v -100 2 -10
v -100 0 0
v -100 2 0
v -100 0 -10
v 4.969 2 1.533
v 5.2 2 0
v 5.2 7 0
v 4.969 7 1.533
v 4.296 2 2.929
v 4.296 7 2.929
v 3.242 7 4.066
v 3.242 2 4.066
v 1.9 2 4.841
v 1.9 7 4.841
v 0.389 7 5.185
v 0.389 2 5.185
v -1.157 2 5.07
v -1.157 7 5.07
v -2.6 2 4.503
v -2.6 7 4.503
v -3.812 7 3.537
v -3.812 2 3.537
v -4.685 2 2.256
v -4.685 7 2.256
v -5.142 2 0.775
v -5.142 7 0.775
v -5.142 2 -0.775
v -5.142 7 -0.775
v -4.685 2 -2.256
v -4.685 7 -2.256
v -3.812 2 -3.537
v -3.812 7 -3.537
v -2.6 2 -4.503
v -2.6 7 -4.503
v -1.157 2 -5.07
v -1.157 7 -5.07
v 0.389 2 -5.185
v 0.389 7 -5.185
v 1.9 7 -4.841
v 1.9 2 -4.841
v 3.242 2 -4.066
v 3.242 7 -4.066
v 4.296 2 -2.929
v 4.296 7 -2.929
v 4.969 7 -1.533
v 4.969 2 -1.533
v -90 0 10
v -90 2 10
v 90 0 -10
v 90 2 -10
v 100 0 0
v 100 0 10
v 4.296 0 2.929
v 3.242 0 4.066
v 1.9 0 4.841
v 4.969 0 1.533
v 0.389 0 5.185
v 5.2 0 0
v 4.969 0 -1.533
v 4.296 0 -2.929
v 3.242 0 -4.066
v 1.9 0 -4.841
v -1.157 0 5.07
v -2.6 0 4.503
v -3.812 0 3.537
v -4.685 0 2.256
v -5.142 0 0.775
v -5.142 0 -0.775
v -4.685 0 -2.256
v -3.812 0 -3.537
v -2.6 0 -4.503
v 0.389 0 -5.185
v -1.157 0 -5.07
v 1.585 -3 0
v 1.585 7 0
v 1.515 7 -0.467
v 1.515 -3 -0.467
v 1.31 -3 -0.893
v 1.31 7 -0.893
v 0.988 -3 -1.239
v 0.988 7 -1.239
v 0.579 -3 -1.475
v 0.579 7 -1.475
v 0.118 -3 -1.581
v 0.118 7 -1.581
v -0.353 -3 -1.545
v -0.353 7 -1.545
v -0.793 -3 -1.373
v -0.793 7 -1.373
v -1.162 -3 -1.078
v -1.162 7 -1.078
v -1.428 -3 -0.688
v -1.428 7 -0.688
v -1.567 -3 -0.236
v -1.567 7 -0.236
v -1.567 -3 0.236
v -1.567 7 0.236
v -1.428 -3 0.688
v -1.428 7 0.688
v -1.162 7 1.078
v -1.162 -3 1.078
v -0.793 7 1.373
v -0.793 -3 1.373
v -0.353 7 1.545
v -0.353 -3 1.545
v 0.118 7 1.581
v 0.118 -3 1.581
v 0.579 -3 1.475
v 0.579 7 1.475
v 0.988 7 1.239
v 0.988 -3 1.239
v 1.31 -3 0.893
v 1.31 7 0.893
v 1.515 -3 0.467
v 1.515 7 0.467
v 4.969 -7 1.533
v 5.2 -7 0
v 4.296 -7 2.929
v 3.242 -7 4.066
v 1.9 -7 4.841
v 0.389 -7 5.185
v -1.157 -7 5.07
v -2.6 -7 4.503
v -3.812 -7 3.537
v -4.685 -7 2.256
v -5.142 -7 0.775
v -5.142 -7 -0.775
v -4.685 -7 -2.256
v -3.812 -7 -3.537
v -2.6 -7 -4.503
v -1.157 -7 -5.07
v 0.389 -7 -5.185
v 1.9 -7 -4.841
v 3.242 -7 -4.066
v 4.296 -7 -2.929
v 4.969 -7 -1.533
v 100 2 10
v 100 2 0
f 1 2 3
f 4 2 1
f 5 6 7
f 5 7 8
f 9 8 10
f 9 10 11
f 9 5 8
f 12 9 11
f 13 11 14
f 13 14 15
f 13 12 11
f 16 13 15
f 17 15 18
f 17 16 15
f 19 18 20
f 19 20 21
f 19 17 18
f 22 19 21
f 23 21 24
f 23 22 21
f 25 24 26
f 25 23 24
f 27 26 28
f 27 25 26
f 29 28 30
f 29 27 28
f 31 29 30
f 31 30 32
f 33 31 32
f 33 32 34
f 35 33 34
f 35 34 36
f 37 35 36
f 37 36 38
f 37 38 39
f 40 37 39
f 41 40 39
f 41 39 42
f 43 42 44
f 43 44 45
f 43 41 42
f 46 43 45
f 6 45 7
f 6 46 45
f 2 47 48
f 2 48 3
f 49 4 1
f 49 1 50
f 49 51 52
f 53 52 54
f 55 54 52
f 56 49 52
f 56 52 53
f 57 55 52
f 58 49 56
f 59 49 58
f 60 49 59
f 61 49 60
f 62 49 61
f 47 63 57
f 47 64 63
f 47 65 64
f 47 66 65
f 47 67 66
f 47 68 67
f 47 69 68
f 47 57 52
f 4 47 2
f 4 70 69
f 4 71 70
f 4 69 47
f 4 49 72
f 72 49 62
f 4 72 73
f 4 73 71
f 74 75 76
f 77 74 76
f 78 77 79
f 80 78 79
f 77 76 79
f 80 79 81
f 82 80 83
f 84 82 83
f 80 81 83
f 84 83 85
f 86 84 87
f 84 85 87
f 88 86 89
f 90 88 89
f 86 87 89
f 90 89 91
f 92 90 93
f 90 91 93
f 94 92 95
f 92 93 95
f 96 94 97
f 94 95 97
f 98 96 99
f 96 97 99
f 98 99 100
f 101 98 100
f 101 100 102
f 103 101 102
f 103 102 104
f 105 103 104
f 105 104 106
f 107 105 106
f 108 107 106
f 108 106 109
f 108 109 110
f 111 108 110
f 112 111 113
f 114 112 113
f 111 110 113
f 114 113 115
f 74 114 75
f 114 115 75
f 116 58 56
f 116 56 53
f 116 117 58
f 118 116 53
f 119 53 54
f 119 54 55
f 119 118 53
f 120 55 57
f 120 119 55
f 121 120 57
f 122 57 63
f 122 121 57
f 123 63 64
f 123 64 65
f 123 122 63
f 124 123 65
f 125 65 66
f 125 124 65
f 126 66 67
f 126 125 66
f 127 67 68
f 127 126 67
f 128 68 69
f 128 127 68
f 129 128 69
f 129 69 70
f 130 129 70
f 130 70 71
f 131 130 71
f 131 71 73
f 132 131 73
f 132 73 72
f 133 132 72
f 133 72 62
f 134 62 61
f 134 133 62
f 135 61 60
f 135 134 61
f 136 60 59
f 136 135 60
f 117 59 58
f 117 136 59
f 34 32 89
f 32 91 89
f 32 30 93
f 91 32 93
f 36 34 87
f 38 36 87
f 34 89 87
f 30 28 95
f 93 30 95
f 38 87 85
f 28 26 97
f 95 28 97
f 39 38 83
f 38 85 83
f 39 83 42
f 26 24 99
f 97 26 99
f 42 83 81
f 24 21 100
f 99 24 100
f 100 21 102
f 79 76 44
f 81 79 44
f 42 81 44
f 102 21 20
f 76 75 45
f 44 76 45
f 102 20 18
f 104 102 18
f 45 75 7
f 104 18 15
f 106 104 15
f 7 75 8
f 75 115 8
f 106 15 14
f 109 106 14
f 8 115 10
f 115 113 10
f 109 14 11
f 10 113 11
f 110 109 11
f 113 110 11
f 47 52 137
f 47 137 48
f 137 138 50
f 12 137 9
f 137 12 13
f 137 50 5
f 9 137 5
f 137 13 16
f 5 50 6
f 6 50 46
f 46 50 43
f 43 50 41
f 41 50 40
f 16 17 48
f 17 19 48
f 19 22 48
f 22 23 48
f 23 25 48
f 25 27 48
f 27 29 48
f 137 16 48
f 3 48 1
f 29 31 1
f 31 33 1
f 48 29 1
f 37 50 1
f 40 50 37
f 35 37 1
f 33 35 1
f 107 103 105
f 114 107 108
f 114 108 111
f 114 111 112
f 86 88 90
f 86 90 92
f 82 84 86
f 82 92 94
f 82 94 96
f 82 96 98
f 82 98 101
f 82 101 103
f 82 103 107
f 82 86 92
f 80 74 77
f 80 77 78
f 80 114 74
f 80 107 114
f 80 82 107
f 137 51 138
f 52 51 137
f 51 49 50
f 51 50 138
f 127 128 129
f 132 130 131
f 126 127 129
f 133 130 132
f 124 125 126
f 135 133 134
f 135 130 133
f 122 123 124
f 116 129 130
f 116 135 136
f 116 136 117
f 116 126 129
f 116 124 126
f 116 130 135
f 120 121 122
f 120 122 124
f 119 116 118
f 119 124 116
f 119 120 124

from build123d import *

# Parameters (mm, degrees)
SKETCH_1_R          = 1.585
EXTRUDE_1_DEPTH     = 2
SKETCH_2_R          = 5.2
EXTRUDE_2_DEPTH     = 7
SKETCH_3_R          = 1.585
CUT_EXTRUDE_1_DEPTH = 10


with BuildPart() as part:
    # 草图1 → 凸台-拉伸1 (new body)
    with BuildSketch(Plane(origin=(0, 0, 0), x_dir=(1, 0, 0), z_dir=(0, 1, 0))):
        Polygon((90, 10), (100, 0), (100, -10), (-90, -10), (-100, 0), (-100, 10), align=None)
        Circle(SKETCH_1_R, mode=Mode.SUBTRACT)
    extrude(amount=EXTRUDE_1_DEPTH)

    # 草图2 → 凸台-拉伸2 (add, symmetric)
    with BuildSketch(Plane.XZ):
        Circle(SKETCH_2_R)
    extrude(amount=EXTRUDE_2_DEPTH, both=True)

    # 草图3 → 切除-拉伸1 (cut)
    with BuildSketch(Plane(origin=(0, 7, 0), x_dir=(1, 0, 0), z_dir=(0, 1, 0))):
        Circle(SKETCH_3_R)
    extrude(amount=-CUT_EXTRUDE_1_DEPTH, mode=Mode.SUBTRACT)


solid = part.part
